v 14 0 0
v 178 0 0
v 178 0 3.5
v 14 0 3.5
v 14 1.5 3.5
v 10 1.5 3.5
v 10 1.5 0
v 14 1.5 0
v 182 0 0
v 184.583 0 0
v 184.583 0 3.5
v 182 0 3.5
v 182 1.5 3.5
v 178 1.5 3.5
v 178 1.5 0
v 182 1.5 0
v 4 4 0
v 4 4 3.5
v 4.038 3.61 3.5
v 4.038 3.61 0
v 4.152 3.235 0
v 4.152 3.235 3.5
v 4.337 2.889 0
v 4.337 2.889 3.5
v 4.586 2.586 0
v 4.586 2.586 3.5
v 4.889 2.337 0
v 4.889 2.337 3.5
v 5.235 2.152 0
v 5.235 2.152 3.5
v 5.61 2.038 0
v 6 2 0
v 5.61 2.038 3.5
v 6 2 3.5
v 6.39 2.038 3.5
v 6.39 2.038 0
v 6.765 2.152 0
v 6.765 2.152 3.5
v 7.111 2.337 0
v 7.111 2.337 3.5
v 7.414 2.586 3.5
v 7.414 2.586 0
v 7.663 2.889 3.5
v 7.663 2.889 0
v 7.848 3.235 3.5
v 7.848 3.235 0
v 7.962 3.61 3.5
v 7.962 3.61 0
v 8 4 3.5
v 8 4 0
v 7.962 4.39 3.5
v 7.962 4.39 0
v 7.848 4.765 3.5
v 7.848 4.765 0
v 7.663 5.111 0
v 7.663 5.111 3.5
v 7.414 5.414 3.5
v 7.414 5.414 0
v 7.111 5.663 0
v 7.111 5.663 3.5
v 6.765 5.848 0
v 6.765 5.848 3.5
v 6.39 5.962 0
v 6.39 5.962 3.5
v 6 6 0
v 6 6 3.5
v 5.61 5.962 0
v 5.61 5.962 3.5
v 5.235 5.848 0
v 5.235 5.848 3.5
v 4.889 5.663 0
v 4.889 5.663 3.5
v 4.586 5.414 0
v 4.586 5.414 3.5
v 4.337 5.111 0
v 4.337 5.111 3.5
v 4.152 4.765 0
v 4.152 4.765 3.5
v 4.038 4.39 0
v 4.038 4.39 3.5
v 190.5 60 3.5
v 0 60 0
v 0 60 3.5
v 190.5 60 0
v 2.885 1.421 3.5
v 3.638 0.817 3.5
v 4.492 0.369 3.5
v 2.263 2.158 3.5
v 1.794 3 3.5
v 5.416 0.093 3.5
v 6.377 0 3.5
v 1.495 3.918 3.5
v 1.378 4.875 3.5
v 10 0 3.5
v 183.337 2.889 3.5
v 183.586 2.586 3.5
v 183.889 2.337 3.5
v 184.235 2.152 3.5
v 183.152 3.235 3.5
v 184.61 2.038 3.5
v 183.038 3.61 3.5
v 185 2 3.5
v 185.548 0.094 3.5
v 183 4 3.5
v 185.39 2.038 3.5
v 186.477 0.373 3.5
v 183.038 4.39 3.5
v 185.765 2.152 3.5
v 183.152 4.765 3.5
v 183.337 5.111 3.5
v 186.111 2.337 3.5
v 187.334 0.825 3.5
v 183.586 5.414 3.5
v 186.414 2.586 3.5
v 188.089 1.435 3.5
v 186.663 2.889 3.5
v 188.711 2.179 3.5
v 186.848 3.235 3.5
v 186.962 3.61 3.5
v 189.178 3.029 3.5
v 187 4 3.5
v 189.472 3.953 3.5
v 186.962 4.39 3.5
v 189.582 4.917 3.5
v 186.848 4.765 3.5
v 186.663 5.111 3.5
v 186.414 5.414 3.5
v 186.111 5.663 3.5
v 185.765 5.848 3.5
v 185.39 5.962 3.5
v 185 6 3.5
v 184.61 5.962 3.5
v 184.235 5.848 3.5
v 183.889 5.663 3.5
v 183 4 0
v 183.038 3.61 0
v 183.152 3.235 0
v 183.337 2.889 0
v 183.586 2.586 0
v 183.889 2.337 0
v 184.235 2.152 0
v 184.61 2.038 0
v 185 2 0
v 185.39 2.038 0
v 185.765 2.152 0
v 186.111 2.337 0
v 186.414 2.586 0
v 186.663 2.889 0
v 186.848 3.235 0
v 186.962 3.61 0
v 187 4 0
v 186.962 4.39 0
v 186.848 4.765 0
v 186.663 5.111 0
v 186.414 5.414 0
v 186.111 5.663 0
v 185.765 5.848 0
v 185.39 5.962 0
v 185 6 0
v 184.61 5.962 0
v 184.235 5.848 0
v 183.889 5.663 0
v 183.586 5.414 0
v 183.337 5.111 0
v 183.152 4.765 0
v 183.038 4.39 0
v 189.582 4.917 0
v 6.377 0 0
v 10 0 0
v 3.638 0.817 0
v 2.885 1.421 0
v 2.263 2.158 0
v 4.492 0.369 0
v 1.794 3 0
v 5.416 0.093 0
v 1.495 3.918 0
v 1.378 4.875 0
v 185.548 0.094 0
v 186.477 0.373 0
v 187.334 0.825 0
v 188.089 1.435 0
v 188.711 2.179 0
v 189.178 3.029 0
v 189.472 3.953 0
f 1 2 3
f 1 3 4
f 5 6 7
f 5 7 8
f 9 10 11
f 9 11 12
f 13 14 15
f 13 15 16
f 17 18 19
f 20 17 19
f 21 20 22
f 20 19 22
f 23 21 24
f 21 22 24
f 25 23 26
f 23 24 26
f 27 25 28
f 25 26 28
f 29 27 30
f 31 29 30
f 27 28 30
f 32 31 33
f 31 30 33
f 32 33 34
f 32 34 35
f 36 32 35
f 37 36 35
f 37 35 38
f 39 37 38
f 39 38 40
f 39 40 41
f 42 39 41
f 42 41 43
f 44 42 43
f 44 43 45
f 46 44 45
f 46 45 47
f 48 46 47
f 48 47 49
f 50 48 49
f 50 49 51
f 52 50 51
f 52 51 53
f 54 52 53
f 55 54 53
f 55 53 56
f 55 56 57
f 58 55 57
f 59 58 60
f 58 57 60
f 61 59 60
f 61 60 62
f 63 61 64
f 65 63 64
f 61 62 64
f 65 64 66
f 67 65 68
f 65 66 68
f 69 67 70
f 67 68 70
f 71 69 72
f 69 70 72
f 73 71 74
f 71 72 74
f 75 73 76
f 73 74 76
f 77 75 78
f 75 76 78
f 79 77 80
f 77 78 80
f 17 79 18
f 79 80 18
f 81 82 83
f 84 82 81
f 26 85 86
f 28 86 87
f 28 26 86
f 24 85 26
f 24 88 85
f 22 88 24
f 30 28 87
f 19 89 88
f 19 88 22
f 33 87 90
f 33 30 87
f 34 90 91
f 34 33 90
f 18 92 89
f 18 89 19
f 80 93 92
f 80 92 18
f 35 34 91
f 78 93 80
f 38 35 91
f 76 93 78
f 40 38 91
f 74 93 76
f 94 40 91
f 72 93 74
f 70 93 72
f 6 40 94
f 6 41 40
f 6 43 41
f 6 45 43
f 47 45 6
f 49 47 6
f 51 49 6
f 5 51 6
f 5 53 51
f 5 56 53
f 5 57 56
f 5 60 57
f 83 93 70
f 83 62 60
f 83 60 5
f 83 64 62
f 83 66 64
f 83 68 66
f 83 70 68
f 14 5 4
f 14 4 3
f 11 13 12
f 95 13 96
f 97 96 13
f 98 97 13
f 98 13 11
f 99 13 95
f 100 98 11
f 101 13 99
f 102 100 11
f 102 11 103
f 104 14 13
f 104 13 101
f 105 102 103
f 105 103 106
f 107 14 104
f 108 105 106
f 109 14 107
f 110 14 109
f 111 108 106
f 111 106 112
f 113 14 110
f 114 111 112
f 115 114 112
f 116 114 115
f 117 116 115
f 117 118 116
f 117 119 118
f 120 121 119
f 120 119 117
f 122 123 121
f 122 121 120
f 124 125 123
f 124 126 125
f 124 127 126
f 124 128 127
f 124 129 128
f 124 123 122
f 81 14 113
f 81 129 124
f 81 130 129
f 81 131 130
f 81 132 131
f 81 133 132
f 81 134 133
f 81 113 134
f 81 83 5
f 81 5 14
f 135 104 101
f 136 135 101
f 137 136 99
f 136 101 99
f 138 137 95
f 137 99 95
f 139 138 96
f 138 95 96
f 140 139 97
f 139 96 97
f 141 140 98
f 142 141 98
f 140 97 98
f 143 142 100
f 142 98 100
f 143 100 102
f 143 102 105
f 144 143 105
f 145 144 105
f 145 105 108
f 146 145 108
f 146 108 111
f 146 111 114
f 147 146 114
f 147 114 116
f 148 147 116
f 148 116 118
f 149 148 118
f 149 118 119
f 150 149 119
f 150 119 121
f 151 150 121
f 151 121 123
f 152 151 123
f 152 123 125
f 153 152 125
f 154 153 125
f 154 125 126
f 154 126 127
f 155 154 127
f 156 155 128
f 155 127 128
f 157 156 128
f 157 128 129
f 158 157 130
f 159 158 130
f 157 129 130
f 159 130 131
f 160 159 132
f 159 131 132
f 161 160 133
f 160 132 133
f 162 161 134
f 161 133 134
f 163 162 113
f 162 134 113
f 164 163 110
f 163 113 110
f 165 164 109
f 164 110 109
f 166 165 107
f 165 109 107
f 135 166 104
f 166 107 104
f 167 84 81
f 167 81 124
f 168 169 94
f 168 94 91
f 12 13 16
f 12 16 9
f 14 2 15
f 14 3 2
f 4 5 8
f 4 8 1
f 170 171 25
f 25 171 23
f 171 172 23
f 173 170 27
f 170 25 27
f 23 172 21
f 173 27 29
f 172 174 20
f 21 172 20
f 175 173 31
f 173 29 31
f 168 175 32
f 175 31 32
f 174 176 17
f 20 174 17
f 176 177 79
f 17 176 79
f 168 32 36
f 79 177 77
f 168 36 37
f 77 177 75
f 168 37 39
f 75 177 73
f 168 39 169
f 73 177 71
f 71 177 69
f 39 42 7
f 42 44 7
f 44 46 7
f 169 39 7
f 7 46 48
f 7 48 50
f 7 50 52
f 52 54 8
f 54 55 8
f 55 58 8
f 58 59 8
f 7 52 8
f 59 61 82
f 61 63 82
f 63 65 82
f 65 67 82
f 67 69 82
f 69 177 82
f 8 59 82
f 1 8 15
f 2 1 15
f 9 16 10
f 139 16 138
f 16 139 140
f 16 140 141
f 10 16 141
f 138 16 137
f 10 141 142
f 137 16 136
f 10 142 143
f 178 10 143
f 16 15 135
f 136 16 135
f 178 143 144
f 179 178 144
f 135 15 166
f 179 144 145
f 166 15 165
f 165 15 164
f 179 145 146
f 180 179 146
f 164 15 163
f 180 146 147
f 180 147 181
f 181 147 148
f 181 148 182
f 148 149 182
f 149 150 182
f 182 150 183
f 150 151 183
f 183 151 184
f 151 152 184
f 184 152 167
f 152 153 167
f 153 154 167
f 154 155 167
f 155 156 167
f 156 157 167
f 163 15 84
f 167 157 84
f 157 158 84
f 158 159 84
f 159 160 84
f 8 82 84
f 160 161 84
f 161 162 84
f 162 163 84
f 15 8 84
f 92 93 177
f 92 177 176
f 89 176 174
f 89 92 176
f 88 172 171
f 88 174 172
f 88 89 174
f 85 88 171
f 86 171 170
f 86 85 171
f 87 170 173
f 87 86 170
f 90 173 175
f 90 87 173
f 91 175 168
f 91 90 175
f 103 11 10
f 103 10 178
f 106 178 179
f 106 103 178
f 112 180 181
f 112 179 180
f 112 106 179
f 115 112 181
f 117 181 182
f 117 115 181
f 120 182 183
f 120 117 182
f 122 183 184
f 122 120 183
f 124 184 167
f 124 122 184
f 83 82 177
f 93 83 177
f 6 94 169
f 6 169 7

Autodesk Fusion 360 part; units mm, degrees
sketch "Sketch1" plane through (0, 0, 0) normal (0, 0, 1) x (1, 0, 0)
  line L0 (0, 60) -> (1.5, 0)
  line L1 (190.5, 60) -> (189.5, 0)
  line L2 (189.5, 0) -> (1.5, 0)
  line L3 (0, 60) -> (190.5, 60)
extrude "Extrude1" add sketch "Sketch1" along normal blind 3.5
fillet "Fillet1" radius 5 1 edges at (189.5, 0, 1.75)
fillet "Fillet2" radius 5 1 edges at (1.5, 0, 1.75)
sketch "Sketch2" plane through (0, 0, 0) normal (0, 0, 1) x (1, 0, 0)
sketch "Sketch3" plane through (0, 0, 3.5) normal (0, 0, 1) x (-1, 0, 0)
  arc A0 (-1.3781, -4.875) -> (-6.3766, 0) centre (-6.3766, -5) ccw
  line L0 (-6.3766, 0) -> (-184.5826, 0)
  arc A1 (-184.5826, 0) -> (-189.5819, -4.9167) centre (-184.5826, -5) ccw
  line L1 (-189.5819, -4.9167) -> (-190.5, -60)
  line L2 (-190.5, -60) -> (0, -60)
  line L3 (0, -60) -> (-1.3781, -4.875)
  circle A2 centre (-6, -4) radius 2
  circle A3 centre (-185, -4) radius 2
  dimension "d7" = 4
  dimension "d8" = 4
extrude "Extrude2" cut sketch "Sketch3" against normal blind 4 contours A2 | A3
sketch "Sketch4" plane through (0, 0, 3.5) normal (0, 0, 1) x (-1, 0, 0)
  circle A0 centre (-185, -4) radius 2
  circle A1 centre (-6, -4) radius 2
  arc A2 (-1.3781, -4.875) -> (-6.3766, 0) centre (-6.3766, -5) ccw
  line L0 (-6.3766, 0) -> (-184.5826, 0)
  arc A3 (-184.5826, 0) -> (-189.5819, -4.9167) centre (-184.5826, -5) ccw
  line L1 (-189.5819, -4.9167) -> (-190.5, -60)
  line L2 (-190.5, -60) -> (0, -60)
  line L3 (0, -60) -> (-1.3781, -4.875)
  line L4 (-10, -1.5) -> (-14, -1.5)
  line L5 (-14, -1.5) -> (-14, 0)
  line L6 (-14, 0) -> (-10, 0)
  line L7 (-10, 0) -> (-10, -1.5)
extrude "Extrude3" cut sketch "Sketch4" against normal blind 4 contours L0 L4 L5 L6 L7
sketch "Sketch5" plane through (0, 0, 3.5) normal (0, 0, 1) x (-1, 0, 0)
  line L0 (-14, -1.5) -> (-14, 0)
  line L1 (-14, 0) -> (-184.5826, 0)
  arc A0 (-184.5826, 0) -> (-189.5819, -4.9167) centre (-184.5826, -5) ccw
  line L2 (-189.5819, -4.9167) -> (-190.5, -60)
  line L3 (-190.5, -60) -> (0, -60)
  line L4 (0, -60) -> (-1.3781, -4.875)
  arc A1 (-1.3781, -4.875) -> (-6.3766, 0) centre (-6.3766, -5) ccw
  line L5 (-6.3766, 0) -> (-10, 0)
  line L6 (-10, 0) -> (-10, -1.5)
  line L7 (-10, -1.5) -> (-14, -1.5)
  circle A2 centre (-185, -4) radius 2
  circle A3 centre (-6, -4) radius 2
  line L8 (-178, -1.5) -> (-182, -1.5)
  line L9 (-182, -1.5) -> (-182, 0)
  line L10 (-182, 0) -> (-178, 0)
  line L11 (-178, 0) -> (-178, -1.5)
extrude "Extrude4" cut sketch "Sketch5" against normal blind 4 contours L1 L8 L9 L10 L11
